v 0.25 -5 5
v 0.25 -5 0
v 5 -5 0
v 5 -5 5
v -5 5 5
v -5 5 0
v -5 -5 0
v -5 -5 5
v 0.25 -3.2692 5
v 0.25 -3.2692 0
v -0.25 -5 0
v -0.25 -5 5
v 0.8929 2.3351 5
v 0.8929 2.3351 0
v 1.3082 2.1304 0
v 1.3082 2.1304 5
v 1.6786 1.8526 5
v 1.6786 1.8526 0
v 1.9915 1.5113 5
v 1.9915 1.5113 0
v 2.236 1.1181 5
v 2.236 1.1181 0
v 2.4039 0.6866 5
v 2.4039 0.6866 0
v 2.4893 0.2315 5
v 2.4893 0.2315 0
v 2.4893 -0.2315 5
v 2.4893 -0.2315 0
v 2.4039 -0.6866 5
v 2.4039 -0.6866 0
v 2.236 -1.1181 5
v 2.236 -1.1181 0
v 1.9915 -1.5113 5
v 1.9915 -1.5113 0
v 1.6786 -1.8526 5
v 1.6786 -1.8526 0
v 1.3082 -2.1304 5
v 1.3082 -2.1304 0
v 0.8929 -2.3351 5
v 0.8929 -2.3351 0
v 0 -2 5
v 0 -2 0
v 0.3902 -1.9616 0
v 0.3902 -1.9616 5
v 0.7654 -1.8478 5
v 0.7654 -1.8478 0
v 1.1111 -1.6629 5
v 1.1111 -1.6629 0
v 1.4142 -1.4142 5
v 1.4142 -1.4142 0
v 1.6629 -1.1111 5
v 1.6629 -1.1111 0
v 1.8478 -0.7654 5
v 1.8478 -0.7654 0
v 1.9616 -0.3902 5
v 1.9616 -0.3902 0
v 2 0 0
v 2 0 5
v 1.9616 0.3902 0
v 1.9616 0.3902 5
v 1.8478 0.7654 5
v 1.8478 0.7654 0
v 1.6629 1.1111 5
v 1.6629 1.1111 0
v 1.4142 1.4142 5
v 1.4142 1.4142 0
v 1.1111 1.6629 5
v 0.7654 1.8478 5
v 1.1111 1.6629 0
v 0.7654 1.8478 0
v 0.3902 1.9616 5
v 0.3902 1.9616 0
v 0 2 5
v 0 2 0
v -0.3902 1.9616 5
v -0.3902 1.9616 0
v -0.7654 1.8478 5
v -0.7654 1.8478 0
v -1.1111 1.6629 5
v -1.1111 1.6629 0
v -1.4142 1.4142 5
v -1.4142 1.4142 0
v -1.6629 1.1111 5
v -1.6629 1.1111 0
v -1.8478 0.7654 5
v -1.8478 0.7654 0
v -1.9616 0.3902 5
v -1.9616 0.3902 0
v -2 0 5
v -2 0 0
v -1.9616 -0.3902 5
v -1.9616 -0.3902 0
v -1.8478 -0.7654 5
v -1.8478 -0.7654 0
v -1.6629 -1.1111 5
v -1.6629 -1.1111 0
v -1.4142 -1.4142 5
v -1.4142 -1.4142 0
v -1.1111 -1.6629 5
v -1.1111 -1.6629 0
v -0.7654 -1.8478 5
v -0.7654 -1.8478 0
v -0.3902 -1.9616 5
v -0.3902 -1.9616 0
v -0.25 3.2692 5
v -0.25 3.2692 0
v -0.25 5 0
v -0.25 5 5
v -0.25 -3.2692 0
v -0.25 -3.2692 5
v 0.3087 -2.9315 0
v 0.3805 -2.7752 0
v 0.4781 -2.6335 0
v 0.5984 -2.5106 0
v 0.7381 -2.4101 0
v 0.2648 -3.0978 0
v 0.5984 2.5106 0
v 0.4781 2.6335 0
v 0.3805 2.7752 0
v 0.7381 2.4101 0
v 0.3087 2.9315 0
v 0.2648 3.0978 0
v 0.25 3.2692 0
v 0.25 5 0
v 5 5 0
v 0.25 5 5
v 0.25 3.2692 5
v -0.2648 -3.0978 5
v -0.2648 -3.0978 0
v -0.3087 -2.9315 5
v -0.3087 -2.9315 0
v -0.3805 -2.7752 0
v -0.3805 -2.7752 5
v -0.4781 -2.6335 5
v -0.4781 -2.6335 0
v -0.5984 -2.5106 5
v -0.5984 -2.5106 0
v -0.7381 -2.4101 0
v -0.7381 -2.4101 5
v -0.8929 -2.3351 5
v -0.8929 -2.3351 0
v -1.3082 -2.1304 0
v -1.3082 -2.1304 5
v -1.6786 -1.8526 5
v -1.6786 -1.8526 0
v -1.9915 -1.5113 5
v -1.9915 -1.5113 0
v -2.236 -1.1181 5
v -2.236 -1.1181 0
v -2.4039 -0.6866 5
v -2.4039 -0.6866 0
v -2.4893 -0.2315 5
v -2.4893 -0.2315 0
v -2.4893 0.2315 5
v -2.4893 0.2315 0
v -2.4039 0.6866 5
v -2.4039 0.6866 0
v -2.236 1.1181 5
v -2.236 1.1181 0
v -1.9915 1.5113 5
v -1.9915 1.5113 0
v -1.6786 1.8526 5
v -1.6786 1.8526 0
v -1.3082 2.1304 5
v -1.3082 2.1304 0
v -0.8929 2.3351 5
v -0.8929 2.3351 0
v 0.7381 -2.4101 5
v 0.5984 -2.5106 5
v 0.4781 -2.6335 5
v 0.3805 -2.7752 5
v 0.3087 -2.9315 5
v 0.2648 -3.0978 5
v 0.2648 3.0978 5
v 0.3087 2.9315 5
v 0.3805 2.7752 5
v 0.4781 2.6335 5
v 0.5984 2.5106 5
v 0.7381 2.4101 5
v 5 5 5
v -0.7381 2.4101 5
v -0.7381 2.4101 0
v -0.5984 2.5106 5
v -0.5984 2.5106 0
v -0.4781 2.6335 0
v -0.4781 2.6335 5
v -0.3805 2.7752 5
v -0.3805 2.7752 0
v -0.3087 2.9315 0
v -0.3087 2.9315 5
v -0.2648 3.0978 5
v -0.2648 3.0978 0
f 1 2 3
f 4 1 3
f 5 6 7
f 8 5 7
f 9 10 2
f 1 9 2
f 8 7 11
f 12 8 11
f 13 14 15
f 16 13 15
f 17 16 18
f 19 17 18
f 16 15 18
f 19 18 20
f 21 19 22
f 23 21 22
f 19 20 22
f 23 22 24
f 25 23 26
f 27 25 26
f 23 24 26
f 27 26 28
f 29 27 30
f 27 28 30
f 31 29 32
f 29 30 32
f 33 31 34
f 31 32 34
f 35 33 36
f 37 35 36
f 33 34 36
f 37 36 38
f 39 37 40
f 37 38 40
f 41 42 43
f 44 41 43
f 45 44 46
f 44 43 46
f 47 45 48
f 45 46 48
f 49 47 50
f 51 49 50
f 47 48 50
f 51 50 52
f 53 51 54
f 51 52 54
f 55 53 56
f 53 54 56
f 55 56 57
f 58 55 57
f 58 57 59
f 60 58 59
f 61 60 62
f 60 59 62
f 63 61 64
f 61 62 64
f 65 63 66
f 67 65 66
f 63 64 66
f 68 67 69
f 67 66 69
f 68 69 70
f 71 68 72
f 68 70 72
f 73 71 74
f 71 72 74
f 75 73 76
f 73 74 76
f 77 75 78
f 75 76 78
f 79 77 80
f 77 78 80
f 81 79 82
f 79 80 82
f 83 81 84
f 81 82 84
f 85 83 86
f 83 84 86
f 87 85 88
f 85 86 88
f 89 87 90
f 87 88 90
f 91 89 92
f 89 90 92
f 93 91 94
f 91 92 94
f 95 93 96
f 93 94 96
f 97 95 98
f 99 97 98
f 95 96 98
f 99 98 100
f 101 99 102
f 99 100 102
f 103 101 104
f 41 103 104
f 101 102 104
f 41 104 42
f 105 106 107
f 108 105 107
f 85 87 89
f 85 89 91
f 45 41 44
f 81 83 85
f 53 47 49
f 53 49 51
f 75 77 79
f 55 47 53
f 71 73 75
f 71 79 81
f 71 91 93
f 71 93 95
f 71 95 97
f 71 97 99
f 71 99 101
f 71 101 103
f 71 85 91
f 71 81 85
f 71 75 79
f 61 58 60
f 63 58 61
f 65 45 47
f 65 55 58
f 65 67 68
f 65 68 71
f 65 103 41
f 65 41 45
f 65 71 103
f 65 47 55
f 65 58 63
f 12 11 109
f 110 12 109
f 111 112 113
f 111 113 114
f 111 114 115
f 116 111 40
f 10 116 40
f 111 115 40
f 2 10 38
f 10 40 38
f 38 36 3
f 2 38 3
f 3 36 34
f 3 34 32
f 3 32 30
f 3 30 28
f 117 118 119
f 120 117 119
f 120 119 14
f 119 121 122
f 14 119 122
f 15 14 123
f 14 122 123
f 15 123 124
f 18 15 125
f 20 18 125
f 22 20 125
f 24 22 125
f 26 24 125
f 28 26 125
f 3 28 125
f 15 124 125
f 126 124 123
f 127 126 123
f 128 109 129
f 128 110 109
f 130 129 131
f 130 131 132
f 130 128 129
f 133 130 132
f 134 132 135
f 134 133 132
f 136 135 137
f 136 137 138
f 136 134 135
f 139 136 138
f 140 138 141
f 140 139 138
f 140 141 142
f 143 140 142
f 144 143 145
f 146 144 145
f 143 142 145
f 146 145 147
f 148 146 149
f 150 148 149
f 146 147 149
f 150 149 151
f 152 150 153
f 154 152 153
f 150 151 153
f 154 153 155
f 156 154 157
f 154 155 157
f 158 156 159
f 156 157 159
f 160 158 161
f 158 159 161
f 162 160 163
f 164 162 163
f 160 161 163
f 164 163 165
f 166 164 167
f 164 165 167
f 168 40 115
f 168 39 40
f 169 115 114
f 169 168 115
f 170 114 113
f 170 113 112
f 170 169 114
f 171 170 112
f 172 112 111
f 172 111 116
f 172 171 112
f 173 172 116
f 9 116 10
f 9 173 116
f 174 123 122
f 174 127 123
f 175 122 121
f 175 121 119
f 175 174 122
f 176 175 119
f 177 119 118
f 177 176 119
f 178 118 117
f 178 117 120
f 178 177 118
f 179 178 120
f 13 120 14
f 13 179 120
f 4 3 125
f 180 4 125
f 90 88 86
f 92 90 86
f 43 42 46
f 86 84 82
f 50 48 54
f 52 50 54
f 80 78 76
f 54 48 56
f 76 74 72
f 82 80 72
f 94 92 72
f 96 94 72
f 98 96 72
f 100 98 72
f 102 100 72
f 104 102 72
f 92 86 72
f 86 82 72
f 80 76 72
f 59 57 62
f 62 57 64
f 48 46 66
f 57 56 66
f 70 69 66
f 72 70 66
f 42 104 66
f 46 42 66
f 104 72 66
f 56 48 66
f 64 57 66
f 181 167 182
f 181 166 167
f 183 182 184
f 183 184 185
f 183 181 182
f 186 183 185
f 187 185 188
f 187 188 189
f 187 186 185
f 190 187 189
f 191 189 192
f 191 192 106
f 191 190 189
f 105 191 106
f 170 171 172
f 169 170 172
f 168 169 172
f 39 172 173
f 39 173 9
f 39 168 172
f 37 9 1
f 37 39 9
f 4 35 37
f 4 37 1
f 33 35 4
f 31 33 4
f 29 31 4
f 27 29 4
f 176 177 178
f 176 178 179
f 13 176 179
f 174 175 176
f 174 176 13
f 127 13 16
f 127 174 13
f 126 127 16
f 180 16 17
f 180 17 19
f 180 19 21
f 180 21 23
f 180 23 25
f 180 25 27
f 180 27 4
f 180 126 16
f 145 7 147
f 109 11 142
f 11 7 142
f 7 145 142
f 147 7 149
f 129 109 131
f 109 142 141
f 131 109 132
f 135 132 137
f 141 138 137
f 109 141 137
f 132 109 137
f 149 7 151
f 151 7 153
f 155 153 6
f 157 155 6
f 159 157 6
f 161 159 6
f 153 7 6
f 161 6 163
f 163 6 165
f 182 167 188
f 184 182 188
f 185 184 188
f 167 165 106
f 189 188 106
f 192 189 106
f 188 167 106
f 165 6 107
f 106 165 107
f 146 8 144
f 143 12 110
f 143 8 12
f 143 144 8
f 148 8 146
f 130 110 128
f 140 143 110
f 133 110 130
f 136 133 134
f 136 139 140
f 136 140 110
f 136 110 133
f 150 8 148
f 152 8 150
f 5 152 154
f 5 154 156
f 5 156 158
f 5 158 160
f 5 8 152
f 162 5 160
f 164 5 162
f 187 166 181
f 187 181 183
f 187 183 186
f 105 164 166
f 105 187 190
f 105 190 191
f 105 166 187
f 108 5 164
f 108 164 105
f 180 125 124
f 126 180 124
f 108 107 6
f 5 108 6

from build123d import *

# Parameters (mm, degrees)
F1_DEPTH = 5
F2_R     = 1
F2_2_R   = 1


# Not quite as in the source:
# - a feature names something its author has since deleted; it is built from what else it names


with BuildPart() as f1:
    # F0 (on Top) → F1 (new body)
    with BuildSketch(Plane.XY):
        with BuildLine():
            Line((5, -5), (5, 5))
            Line((5, 5), (0.25, 5))
            Line((0.25, 5), (0.25, 2.4874685928))
            ThreePointArc((0.25, 2.4874685928), (2.5, 0), (0.25, -2.4874685928))
            Line((0.25, -2.4874685928), (0.25, -5))
            Line((0.25, -5), (5, -5))
        make_face()
    extrude(amount=F1_DEPTH)

    # F2
    f2_edges = [f1.edges().sort_by_distance(p)[0] for p in [
        (0.25, -2.487469, 2.5),
        (0.25, 2.487469, 2.5),
    ]]
    fillet(f2_edges, radius=F2_R)


with BuildPart() as f1b:
    # F0 (on Top) → F1, piece 2 (new body)
    with BuildSketch(Plane.XY):
        with BuildLine():
            Line((-0.25, 5), (-5, 5))
            Line((-5, 5), (-5, -5))
            Line((-5, -5), (-0.25, -5))
            Line((-0.25, -5), (-0.25, -2.4874685928))
            ThreePointArc((-0.25, -2.4874685928), (-2.5, 0), (-0.25, 2.4874685928))
            Line((-0.25, 2.4874685928), (-0.25, 5))
        make_face()
    extrude(amount=F1_DEPTH)

    # F2#2
    f2_2_edges = [f1b.edges().sort_by_distance(p)[0] for p in [
        (-0.25, -2.487469, 2.5),
        (-0.25, 2.487469, 2.5),
    ]]
    fillet(f2_2_edges, radius=F2_2_R)


with BuildPart() as f1c:
    # F0 (on Top) → F1, piece 3 (new body)
    with BuildSketch(Plane.XY):
        with BuildLine():
            ThreePointArc((0, 2), (-2, 0), (0, -2))
            Line((0, -2), (0, 2))
        make_face()
        with BuildLine():
            Line((0, 2), (0, -2))
            ThreePointArc((0, -2), (2, 0), (0, 2))
        make_face()
    extrude(amount=F1_DEPTH)


solid = Compound([f1.part, f1b.part, f1c.part])
